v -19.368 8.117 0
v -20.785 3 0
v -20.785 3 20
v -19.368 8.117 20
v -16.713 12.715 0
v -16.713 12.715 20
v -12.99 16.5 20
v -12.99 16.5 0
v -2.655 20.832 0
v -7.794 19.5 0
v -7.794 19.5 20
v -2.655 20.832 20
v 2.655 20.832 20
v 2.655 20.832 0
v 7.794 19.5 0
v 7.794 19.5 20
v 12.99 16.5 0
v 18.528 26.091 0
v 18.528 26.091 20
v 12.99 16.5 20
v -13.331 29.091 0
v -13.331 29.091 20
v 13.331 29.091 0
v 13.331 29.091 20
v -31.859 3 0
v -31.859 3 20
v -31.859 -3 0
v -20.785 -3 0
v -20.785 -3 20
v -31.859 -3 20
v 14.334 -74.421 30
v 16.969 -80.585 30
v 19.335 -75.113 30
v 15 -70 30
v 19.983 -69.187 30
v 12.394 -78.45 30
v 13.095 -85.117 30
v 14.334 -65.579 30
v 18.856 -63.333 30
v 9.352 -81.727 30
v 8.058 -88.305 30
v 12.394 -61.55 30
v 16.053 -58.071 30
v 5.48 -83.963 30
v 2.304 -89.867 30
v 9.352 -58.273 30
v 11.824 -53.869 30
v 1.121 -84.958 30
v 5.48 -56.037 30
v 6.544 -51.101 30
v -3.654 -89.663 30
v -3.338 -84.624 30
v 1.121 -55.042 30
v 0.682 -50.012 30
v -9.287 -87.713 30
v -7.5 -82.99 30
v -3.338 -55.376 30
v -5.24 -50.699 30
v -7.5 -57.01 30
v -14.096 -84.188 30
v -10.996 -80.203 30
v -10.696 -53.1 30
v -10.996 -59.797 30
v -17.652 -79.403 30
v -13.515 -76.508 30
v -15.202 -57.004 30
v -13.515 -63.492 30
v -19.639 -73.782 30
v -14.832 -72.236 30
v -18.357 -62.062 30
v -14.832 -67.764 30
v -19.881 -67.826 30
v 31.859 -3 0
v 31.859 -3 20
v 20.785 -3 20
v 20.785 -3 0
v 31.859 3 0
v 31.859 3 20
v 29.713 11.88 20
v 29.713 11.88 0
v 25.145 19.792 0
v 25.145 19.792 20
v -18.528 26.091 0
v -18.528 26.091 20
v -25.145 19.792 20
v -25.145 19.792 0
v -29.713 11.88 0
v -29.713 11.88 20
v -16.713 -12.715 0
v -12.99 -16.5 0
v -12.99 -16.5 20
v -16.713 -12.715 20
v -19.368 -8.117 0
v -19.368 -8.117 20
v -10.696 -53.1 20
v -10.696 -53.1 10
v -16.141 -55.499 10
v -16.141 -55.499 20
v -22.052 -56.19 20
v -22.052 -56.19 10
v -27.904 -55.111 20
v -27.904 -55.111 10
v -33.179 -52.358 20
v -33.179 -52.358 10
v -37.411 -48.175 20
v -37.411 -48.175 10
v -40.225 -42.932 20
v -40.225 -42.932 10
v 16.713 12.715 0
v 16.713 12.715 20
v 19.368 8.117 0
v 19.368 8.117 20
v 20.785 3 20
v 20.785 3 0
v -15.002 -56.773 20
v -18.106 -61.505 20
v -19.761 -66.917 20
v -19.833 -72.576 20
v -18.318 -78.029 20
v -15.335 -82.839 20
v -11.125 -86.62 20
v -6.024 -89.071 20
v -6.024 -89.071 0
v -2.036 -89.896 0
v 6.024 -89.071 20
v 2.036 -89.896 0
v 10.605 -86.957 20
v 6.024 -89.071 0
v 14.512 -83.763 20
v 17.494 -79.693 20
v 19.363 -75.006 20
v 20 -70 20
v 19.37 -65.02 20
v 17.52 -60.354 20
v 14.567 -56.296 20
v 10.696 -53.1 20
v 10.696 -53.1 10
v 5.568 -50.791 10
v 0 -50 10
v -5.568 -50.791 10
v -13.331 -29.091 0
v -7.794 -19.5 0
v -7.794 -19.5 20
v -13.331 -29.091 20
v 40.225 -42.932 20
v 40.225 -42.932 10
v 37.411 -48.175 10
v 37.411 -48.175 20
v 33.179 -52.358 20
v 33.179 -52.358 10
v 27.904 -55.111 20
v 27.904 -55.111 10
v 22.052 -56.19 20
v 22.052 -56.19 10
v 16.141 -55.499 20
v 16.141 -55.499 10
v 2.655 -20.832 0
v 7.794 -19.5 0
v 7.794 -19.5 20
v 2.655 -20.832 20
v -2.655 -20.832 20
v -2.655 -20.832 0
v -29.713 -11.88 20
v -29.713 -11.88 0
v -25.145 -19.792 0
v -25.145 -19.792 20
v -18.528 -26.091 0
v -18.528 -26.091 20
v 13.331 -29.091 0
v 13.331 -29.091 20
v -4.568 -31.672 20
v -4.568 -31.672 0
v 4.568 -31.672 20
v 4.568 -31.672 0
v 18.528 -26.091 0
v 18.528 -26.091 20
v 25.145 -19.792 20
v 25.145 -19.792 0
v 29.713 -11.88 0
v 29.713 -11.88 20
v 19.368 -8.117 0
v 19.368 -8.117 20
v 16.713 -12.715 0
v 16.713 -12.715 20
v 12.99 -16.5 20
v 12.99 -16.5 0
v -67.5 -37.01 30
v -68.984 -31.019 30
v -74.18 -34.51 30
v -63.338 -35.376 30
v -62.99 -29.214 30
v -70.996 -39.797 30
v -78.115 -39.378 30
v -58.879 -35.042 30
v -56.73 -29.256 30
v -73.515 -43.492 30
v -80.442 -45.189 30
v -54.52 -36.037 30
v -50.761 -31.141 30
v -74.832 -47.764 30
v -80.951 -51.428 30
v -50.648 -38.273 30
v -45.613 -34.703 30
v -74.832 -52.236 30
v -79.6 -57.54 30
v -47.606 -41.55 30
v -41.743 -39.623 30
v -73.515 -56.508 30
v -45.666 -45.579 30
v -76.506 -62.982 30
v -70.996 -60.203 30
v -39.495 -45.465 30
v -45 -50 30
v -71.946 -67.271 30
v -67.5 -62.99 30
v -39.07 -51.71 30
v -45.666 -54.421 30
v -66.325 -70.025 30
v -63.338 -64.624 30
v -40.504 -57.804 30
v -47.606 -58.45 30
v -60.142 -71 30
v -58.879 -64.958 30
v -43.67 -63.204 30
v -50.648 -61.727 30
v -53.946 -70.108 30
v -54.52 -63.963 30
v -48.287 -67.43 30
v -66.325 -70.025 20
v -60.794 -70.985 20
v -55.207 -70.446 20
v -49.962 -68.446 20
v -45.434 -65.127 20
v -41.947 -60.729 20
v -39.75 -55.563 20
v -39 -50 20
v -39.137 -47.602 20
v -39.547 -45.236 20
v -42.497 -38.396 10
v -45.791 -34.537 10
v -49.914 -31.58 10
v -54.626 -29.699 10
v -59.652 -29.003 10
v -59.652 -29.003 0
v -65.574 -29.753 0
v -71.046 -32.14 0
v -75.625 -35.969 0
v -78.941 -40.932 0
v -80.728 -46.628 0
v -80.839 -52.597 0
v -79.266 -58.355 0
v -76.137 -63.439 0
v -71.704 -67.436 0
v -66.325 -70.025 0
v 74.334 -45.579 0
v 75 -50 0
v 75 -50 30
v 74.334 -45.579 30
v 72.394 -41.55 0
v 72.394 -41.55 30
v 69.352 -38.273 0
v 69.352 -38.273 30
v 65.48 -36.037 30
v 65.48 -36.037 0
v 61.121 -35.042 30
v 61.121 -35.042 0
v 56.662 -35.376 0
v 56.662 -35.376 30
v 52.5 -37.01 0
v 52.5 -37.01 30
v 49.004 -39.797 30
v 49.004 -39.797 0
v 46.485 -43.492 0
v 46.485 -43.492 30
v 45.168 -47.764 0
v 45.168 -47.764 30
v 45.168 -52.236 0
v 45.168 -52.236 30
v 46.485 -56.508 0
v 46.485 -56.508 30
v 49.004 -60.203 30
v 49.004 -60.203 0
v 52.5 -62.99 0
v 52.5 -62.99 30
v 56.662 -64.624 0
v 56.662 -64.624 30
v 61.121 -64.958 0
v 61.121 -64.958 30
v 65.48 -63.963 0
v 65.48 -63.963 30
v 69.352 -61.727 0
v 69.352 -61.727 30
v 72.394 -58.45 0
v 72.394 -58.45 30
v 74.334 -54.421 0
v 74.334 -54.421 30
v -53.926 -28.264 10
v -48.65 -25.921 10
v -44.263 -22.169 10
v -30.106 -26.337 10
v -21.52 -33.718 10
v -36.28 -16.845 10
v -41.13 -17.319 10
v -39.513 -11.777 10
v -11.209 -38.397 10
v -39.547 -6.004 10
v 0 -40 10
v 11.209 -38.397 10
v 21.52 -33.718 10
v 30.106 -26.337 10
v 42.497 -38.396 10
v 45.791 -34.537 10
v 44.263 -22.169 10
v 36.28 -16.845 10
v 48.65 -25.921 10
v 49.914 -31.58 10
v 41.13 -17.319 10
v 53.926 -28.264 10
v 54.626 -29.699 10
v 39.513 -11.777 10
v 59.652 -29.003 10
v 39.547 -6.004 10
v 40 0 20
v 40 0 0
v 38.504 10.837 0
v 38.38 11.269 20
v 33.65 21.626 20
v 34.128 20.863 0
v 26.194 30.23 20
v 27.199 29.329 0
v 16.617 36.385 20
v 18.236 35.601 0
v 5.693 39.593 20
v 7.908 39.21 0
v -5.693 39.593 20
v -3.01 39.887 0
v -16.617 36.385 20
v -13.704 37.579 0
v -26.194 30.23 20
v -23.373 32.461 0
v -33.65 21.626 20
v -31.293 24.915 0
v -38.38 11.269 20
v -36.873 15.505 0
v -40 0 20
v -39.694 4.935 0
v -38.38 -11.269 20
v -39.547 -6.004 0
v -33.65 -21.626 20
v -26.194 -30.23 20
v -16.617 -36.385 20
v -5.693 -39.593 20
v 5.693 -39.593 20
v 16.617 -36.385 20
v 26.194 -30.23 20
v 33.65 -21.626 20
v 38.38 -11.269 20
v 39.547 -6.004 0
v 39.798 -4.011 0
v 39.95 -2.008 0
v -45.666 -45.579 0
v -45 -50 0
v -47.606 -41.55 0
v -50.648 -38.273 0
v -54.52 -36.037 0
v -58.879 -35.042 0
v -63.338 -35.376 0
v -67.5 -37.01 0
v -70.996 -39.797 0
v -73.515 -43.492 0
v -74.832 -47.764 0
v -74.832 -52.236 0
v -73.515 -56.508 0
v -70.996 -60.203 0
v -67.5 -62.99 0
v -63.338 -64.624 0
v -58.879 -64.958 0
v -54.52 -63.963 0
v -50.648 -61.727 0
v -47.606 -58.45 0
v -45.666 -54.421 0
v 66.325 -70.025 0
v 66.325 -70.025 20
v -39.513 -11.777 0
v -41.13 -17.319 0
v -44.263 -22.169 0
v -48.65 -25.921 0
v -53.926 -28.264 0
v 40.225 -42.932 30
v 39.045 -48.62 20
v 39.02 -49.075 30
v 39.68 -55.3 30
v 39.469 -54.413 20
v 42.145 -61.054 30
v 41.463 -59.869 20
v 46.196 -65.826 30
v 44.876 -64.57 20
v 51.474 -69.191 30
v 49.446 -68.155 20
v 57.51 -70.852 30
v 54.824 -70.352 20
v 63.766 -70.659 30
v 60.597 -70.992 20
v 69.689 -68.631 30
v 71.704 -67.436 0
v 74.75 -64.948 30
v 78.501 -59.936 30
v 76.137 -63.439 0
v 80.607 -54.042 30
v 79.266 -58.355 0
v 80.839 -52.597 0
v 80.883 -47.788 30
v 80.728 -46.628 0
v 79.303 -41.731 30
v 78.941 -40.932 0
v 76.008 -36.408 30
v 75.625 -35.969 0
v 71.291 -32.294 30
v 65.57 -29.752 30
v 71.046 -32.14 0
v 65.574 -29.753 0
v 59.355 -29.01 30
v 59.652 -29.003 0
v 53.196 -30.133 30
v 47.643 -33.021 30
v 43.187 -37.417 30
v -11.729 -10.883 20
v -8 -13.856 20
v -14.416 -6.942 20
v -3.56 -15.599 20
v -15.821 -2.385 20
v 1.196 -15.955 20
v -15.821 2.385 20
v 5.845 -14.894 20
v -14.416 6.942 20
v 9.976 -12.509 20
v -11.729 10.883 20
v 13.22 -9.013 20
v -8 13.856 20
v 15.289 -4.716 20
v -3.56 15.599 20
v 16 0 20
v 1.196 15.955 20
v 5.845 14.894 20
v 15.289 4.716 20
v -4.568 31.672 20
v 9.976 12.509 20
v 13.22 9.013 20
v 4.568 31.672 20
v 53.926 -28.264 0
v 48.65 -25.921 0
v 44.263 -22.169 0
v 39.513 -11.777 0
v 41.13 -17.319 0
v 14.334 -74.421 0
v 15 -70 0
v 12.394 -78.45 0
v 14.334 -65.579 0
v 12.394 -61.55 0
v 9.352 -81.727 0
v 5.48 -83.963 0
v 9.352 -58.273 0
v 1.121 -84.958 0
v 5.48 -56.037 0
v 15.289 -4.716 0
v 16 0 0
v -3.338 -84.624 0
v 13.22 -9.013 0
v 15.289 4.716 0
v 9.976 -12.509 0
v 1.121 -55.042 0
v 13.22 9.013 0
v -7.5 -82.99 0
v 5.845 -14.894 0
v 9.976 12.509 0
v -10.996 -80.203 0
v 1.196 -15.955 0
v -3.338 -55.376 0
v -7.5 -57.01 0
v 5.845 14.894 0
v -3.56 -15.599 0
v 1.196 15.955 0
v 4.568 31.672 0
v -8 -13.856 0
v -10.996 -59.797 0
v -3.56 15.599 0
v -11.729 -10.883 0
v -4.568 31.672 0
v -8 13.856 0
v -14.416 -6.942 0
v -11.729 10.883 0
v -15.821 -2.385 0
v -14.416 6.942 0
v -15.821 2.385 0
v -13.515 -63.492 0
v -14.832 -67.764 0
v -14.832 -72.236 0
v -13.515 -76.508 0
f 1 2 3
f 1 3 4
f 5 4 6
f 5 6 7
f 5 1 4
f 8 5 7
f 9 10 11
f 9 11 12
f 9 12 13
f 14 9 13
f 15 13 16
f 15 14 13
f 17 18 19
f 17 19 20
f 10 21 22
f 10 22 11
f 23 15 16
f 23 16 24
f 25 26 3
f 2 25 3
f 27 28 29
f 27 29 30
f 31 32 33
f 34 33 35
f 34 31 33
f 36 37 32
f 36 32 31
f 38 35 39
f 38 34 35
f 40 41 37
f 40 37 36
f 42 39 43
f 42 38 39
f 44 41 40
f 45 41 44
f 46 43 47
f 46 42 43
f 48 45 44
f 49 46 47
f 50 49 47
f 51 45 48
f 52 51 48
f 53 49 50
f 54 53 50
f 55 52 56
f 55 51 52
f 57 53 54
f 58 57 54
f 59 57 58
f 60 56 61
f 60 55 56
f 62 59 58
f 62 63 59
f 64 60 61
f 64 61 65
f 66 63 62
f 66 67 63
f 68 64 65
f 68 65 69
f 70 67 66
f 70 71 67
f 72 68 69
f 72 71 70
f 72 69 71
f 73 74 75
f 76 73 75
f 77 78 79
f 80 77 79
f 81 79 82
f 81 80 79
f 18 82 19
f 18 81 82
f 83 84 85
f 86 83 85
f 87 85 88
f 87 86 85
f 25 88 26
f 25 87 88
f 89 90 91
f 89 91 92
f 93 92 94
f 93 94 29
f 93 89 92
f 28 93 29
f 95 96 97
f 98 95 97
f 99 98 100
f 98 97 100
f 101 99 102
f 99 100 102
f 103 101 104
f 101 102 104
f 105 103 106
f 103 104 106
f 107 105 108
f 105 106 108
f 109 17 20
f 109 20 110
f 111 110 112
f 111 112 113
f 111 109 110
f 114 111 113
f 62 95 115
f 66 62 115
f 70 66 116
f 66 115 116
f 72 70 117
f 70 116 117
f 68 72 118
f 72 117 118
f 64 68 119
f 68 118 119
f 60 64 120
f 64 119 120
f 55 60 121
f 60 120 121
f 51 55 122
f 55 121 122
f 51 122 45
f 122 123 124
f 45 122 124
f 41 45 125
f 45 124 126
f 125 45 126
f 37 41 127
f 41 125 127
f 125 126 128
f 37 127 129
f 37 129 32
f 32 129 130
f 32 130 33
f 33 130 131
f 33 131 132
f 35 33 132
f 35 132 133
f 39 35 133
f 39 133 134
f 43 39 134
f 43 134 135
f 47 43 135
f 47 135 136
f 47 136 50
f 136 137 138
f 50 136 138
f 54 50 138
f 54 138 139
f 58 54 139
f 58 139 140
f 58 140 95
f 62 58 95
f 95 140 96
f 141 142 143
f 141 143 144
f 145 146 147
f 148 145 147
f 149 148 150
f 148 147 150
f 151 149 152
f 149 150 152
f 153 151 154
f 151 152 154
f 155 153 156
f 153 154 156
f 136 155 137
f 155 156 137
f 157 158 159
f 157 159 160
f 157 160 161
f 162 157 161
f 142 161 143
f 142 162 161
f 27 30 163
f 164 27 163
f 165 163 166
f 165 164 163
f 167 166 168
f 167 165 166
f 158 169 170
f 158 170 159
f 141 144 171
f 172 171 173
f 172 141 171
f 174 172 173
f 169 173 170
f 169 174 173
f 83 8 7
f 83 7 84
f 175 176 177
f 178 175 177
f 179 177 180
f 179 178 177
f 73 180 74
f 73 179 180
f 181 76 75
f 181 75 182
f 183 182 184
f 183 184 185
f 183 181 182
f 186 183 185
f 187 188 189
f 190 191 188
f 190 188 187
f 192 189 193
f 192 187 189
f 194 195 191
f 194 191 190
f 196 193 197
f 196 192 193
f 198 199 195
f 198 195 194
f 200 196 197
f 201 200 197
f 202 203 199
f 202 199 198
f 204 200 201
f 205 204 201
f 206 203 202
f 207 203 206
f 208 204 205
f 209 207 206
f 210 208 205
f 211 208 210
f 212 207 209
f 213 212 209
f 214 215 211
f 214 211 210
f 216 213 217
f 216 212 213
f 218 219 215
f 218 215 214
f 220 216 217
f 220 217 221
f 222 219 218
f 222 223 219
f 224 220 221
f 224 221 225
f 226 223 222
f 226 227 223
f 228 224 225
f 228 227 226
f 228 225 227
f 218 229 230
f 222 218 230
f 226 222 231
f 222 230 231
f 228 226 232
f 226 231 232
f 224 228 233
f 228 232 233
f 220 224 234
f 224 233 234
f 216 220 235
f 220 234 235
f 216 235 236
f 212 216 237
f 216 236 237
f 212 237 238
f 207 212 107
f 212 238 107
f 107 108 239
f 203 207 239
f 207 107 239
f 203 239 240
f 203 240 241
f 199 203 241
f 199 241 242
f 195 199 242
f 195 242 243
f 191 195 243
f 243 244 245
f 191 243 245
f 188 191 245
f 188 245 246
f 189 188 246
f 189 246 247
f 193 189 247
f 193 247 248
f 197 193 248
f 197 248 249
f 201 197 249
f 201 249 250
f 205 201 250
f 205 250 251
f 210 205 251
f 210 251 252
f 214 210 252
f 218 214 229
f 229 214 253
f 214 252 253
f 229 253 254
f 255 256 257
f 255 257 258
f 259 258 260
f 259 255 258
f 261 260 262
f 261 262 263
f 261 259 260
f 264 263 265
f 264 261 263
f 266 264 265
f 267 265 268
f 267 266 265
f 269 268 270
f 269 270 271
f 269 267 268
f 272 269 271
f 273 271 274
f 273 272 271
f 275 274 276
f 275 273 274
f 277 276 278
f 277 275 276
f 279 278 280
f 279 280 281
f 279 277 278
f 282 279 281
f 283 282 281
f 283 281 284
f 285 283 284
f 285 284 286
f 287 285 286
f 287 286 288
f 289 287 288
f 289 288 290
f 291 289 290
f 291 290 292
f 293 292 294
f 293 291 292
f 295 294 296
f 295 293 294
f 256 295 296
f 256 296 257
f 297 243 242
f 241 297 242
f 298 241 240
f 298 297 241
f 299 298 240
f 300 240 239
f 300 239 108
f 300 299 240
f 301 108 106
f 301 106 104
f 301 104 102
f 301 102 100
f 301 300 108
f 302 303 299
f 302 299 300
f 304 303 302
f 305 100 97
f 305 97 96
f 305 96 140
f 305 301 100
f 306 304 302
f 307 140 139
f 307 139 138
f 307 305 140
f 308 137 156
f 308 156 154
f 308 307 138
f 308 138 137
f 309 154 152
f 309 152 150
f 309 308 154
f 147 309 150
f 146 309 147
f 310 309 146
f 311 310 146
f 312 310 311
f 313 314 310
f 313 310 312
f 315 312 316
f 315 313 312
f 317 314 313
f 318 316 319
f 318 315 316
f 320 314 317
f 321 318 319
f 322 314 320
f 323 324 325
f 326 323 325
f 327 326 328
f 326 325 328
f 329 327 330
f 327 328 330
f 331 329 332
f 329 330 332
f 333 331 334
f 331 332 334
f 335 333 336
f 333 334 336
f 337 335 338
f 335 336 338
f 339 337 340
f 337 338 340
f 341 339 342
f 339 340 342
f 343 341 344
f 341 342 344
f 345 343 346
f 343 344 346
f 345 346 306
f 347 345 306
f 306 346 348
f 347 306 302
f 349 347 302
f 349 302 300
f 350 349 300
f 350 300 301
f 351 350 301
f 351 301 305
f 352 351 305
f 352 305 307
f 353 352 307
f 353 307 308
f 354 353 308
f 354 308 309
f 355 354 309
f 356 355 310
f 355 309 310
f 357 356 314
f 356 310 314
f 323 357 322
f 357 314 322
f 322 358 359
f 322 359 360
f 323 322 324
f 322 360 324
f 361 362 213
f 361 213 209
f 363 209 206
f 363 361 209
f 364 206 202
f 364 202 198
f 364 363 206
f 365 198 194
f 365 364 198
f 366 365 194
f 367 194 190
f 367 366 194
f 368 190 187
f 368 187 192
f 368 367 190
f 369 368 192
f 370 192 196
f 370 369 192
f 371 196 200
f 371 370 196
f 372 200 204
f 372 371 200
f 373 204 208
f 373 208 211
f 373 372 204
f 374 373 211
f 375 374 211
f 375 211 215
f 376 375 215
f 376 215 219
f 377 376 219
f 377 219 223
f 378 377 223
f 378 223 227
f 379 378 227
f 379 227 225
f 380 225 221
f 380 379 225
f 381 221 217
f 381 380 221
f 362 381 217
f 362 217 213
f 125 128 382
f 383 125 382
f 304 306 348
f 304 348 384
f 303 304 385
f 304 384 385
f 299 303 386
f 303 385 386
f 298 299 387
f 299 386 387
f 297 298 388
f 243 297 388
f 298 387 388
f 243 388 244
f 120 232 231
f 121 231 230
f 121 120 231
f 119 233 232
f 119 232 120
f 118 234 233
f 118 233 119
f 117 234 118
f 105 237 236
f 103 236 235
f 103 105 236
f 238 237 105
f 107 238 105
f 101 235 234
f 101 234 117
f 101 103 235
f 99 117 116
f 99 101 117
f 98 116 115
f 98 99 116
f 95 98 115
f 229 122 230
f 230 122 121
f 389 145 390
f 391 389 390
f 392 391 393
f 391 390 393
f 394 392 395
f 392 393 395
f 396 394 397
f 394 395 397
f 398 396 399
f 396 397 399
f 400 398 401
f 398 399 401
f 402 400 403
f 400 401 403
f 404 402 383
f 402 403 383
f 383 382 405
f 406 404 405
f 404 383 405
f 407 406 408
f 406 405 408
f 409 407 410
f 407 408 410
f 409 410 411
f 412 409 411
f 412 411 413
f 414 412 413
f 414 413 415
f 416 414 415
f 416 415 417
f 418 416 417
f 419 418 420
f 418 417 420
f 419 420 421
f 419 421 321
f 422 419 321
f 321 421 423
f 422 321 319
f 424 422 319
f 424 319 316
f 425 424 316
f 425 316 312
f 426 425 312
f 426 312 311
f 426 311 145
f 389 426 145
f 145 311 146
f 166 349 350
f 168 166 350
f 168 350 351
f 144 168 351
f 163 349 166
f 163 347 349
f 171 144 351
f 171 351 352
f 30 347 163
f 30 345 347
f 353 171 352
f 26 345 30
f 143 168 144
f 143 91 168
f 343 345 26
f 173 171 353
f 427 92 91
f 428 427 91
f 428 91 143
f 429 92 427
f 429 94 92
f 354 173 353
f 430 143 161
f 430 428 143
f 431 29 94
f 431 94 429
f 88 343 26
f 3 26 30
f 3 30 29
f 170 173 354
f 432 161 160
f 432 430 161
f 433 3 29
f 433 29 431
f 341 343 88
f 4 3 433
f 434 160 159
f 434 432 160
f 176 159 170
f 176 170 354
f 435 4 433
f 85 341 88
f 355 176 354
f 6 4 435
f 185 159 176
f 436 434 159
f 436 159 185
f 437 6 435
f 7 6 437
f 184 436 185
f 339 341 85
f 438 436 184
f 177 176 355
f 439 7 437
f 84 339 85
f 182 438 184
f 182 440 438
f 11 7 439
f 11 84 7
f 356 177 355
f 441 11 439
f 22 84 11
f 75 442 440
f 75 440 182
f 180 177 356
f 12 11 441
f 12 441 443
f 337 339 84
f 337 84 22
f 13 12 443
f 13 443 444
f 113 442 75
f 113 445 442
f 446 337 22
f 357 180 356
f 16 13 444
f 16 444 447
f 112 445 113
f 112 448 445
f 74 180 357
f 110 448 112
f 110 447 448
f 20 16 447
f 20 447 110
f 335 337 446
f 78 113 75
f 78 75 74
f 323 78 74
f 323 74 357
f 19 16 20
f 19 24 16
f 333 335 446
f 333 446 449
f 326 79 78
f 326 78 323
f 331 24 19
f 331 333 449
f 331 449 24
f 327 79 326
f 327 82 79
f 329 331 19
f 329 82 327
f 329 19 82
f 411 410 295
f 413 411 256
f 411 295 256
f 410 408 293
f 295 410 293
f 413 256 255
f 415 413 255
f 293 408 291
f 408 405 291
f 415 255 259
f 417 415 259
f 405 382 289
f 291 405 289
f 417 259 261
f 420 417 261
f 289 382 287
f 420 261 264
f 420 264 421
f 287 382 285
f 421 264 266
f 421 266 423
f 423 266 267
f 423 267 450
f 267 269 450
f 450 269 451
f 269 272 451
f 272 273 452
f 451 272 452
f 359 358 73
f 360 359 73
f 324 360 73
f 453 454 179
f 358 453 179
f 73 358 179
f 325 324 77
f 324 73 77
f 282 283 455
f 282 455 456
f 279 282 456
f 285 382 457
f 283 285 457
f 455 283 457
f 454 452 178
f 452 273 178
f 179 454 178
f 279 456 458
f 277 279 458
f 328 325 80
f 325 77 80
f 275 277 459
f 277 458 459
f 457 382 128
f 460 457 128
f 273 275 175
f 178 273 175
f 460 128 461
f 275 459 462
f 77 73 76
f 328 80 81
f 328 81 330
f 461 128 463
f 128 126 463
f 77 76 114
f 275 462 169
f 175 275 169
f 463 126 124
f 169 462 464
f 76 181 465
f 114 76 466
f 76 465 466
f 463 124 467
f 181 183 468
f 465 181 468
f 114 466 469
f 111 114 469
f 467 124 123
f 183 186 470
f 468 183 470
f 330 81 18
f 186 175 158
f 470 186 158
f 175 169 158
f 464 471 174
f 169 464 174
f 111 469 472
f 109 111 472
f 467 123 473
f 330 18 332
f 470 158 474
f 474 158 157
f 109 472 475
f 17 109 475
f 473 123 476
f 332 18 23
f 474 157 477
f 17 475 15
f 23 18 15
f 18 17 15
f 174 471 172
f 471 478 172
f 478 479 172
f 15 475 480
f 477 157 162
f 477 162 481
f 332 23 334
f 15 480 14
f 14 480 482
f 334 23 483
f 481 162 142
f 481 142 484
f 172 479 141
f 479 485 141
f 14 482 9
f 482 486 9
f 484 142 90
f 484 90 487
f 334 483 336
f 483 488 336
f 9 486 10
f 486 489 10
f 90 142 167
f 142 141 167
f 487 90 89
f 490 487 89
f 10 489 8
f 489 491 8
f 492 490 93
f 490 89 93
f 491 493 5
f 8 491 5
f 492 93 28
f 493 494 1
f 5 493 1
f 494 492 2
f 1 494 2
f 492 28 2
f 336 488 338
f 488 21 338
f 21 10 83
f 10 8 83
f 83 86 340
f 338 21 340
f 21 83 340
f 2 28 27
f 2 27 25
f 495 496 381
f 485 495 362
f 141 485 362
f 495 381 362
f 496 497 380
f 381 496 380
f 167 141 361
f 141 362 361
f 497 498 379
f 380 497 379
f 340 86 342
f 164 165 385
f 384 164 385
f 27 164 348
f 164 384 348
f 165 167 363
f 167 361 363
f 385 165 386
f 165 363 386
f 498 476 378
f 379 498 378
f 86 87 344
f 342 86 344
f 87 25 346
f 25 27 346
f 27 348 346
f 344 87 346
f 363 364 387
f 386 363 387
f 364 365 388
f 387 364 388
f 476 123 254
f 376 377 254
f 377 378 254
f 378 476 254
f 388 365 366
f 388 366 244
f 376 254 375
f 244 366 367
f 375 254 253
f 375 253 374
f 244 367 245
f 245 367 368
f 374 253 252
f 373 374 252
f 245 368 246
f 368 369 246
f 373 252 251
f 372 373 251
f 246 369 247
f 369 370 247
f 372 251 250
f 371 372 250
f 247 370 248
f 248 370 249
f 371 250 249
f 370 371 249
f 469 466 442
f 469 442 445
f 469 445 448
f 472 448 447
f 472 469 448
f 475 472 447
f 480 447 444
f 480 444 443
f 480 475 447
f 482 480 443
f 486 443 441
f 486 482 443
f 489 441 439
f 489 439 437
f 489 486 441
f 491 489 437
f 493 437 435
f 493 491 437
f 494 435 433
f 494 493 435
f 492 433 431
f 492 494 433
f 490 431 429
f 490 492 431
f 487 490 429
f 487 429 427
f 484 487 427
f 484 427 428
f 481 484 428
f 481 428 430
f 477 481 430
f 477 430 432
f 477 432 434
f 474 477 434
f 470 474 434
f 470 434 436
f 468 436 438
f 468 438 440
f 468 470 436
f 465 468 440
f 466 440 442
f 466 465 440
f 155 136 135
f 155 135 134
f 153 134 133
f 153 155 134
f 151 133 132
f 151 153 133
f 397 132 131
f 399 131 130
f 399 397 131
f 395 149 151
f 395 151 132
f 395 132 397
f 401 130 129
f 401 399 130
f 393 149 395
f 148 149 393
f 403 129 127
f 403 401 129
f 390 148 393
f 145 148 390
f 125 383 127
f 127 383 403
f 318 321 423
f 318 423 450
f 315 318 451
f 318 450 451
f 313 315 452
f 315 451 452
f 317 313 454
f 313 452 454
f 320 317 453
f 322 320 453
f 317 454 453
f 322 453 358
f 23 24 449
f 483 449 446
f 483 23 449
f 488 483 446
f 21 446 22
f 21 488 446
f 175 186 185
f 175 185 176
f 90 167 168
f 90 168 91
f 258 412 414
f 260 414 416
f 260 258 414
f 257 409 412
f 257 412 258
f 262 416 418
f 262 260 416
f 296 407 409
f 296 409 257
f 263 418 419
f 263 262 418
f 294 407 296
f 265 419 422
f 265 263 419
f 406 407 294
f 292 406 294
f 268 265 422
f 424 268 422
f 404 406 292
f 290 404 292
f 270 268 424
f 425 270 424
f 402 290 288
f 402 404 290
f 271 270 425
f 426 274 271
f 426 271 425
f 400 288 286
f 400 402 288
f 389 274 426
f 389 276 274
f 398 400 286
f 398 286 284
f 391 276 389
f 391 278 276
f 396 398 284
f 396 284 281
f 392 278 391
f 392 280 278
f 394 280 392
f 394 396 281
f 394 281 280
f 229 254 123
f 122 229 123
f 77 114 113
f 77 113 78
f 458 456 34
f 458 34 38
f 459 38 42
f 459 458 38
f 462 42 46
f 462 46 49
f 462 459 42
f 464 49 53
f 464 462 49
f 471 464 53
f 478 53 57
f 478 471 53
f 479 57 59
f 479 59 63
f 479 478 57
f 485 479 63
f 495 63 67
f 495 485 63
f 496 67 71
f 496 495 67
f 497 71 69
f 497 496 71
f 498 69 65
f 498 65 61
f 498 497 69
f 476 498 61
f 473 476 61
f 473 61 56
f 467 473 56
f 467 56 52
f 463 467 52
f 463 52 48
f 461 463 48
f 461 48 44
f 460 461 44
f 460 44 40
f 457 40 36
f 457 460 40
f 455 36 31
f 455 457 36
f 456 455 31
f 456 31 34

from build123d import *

# Parameters (mm, degrees)
BOSS_EXTRUDE1_DEPTH   = 20
BOSS_EXTRUDE1_2_DEPTH = 20
SKETCH3_R             = 40
SKETCH3_R_2           = 16
BOSS_EXTRUDE1_3_DEPTH = 20
BOSS_EXTRUDE2_DEPTH   = 10
SKETCH3_4_R           = 21
SKETCH3_4_R_2         = 15
SKETCH3_4_R_3         = 20
BOSS_EXTRUDE3_DEPTH   = 30


with BuildPart() as part:
    # Sketch3 → Boss-Extrude1 (new body)
    with BuildSketch(Plane.XY):
        with BuildLine():
            Line((6.023764702, -89.071294105), (66.324952937, -70.02485881))
            ThreePointArc((66.324952937, -70.02485881), (44.876208292, -64.569520389), (40.22513893, -42.932124106))
            ThreePointArc((40.22513893, -42.932124106), (27.903629702, -55.111072059), (10.695968955, -53.100406866))
            ThreePointArc((10.695968955, -53.100406866), (19.833394958, -72.576129737), (6.023764702, -89.071294105))
        make_face()
    extrude(amount=BOSS_EXTRUDE1_DEPTH)



with BuildPart() as body_2:
    # Sketch3 → Boss-Extrude1 2 (new body)
    with BuildSketch(Plane.XY):
        with BuildLine():
            Line((-66.324952937, -70.02485881), (-6.023764702, -89.071294105))
            ThreePointArc((-6.023764702, -89.071294105), (-19.833394958, -72.576129737), (-10.695968955, -53.100406866))
            ThreePointArc((-10.695968955, -53.100406866), (-27.903629702, -55.111072059), (-40.22513893, -42.932124106))
            ThreePointArc((-40.22513893, -42.932124106), (-44.876208292, -64.569520389), (-66.324952937, -70.02485881))
        make_face()
    extrude(amount=BOSS_EXTRUDE1_2_DEPTH)


with BuildPart() as body_3:
    # Sketch3 → Boss-Extrude1 3 (new body)
    with BuildSketch(Plane.XY):
        Circle(SKETCH3_R)
        with BuildLine():
            ThreePointArc((-7.794228634, -19.5), (0, -21), (7.794228634, -19.5))
            Line((7.794228634, -19.5), (13.331456111, -29.090759323))
            ThreePointArc((13.331456111, -29.090759323), (0, -32), (-13.331456111, -29.090759323))
            Line((-13.331456111, -29.090759323), (-7.794228634, -19.5))
        make_face(mode=Mode.SUBTRACT)
        with BuildLine():
            ThreePointArc((-20.784609691, -3), (-18.186533479, -10.5), (-12.990381057, -16.5))
            Line((-12.990381057, -16.5), (-18.527608533, -26.090759323))
            ThreePointArc((-18.527608533, -26.090759323), (-27.712812921, -16), (-31.859064644, -3))
            Line((-31.859064644, -3), (-20.784609691, -3))
        make_face(mode=Mode.SUBTRACT)
        with BuildLine():
            ThreePointArc((-12.990381057, 16.5), (-18.186533479, 10.5), (-20.784609691, 3))
            Line((-20.784609691, 3), (-31.859064644, 3))
            ThreePointArc((-31.859064644, 3), (-27.712812921, 16), (-18.527608533, 26.090759323))
            Line((-18.527608533, 26.090759323), (-12.990381057, 16.5))
        make_face(mode=Mode.SUBTRACT)
        with BuildLine():
            ThreePointArc((7.794228634, 19.5), (0, 21), (-7.794228634, 19.5))
            Line((-7.794228634, 19.5), (-13.331456111, 29.090759323))
            ThreePointArc((-13.331456111, 29.090759323), (0, 32), (13.331456111, 29.090759323))
            Line((13.331456111, 29.090759323), (7.794228634, 19.5))
        make_face(mode=Mode.SUBTRACT)
        with BuildLine():
            ThreePointArc((12.990381057, -16.5), (18.186533479, -10.5), (20.784609691, -3))
            Line((20.784609691, -3), (31.859064644, -3))
            ThreePointArc((31.859064644, -3), (27.712812921, -16), (18.527608533, -26.090759323))
            Line((18.527608533, -26.090759323), (12.990381057, -16.5))
        make_face(mode=Mode.SUBTRACT)
        Circle(SKETCH3_R_2, mode=Mode.SUBTRACT)
        with BuildLine():
            Line((31.859064644, 3), (20.784609691, 3))
            ThreePointArc((20.784609691, 3), (18.186533479, 10.5), (12.990381057, 16.5))
            Line((12.990381057, 16.5), (18.527608533, 26.090759323))
            ThreePointArc((18.527608533, 26.090759323), (27.712812921, 16), (31.859064644, 3))
        make_face(mode=Mode.SUBTRACT)
    extrude(amount=BOSS_EXTRUDE1_3_DEPTH)


with BuildPart() as part_1:
    add(part.part)

    add(body_2.part)  # Boss-Extrude2 merges body 2

    add(body_3.part)  # Boss-Extrude2 merges body 3
    # Sketch3<3> → Boss-Extrude2 (add)
    with BuildSketch(Plane.XY):
        with BuildLine():
            ThreePointArc((10.695968955, -53.100406866), (27.903629702, -55.111072059), (40.22513893, -42.932124106))
            ThreePointArc((40.22513893, -42.932124106), (47.76318349, -32.933649432), (59.651863383, -29.002885891))
            ThreePointArc((59.651863383, -29.002885891), (44.262528341, -22.168588856), (39.546869801, -6.003756239))
            ThreePointArc((39.546869801, -6.003756239), (0, -40), (-39.546869801, -6.003756239))
            ThreePointArc((-39.546869801, -6.003756239), (-44.262528341, -22.168588856), (-59.651863383, -29.002885891))
            ThreePointArc((-59.651863383, -29.002885891), (-47.76318349, -32.933649432), (-40.22513893, -42.932124106))
            ThreePointArc((-40.22513893, -42.932124106), (-27.903629702, -55.111072059), (-10.695968955, -53.100406866))
            ThreePointArc((-10.695968955, -53.100406866), (0, -50), (10.695968955, -53.100406866))
        make_face()
    extrude(amount=BOSS_EXTRUDE2_DEPTH)

    # Sketch3<4> → Boss-Extrude3 (add)
    # profile 1 of 3: a face of its own
    with BuildSketch(Plane.XY):
        with Locations((60, -50)):
            Circle(SKETCH3_4_R)
        with Locations((60, -50)):
            Circle(SKETCH3_4_R_2, mode=Mode.SUBTRACT)
    # profile 2 of 3: a face of its own
    with BuildSketch(Plane.XY):
        with Locations((0, -70)):
            Circle(SKETCH3_4_R_3)
        with Locations((0, -70)):
            Circle(SKETCH3_4_R_2, mode=Mode.SUBTRACT)
    # profile 3 of 3: a face of its own
    with BuildSketch(Plane.XY):
        with Locations((-60, -50)):
            Circle(SKETCH3_4_R)
        with Locations((-60, -50)):
            Circle(SKETCH3_4_R_2, mode=Mode.SUBTRACT)
    extrude(amount=BOSS_EXTRUDE3_DEPTH)


solid = part_1.part
